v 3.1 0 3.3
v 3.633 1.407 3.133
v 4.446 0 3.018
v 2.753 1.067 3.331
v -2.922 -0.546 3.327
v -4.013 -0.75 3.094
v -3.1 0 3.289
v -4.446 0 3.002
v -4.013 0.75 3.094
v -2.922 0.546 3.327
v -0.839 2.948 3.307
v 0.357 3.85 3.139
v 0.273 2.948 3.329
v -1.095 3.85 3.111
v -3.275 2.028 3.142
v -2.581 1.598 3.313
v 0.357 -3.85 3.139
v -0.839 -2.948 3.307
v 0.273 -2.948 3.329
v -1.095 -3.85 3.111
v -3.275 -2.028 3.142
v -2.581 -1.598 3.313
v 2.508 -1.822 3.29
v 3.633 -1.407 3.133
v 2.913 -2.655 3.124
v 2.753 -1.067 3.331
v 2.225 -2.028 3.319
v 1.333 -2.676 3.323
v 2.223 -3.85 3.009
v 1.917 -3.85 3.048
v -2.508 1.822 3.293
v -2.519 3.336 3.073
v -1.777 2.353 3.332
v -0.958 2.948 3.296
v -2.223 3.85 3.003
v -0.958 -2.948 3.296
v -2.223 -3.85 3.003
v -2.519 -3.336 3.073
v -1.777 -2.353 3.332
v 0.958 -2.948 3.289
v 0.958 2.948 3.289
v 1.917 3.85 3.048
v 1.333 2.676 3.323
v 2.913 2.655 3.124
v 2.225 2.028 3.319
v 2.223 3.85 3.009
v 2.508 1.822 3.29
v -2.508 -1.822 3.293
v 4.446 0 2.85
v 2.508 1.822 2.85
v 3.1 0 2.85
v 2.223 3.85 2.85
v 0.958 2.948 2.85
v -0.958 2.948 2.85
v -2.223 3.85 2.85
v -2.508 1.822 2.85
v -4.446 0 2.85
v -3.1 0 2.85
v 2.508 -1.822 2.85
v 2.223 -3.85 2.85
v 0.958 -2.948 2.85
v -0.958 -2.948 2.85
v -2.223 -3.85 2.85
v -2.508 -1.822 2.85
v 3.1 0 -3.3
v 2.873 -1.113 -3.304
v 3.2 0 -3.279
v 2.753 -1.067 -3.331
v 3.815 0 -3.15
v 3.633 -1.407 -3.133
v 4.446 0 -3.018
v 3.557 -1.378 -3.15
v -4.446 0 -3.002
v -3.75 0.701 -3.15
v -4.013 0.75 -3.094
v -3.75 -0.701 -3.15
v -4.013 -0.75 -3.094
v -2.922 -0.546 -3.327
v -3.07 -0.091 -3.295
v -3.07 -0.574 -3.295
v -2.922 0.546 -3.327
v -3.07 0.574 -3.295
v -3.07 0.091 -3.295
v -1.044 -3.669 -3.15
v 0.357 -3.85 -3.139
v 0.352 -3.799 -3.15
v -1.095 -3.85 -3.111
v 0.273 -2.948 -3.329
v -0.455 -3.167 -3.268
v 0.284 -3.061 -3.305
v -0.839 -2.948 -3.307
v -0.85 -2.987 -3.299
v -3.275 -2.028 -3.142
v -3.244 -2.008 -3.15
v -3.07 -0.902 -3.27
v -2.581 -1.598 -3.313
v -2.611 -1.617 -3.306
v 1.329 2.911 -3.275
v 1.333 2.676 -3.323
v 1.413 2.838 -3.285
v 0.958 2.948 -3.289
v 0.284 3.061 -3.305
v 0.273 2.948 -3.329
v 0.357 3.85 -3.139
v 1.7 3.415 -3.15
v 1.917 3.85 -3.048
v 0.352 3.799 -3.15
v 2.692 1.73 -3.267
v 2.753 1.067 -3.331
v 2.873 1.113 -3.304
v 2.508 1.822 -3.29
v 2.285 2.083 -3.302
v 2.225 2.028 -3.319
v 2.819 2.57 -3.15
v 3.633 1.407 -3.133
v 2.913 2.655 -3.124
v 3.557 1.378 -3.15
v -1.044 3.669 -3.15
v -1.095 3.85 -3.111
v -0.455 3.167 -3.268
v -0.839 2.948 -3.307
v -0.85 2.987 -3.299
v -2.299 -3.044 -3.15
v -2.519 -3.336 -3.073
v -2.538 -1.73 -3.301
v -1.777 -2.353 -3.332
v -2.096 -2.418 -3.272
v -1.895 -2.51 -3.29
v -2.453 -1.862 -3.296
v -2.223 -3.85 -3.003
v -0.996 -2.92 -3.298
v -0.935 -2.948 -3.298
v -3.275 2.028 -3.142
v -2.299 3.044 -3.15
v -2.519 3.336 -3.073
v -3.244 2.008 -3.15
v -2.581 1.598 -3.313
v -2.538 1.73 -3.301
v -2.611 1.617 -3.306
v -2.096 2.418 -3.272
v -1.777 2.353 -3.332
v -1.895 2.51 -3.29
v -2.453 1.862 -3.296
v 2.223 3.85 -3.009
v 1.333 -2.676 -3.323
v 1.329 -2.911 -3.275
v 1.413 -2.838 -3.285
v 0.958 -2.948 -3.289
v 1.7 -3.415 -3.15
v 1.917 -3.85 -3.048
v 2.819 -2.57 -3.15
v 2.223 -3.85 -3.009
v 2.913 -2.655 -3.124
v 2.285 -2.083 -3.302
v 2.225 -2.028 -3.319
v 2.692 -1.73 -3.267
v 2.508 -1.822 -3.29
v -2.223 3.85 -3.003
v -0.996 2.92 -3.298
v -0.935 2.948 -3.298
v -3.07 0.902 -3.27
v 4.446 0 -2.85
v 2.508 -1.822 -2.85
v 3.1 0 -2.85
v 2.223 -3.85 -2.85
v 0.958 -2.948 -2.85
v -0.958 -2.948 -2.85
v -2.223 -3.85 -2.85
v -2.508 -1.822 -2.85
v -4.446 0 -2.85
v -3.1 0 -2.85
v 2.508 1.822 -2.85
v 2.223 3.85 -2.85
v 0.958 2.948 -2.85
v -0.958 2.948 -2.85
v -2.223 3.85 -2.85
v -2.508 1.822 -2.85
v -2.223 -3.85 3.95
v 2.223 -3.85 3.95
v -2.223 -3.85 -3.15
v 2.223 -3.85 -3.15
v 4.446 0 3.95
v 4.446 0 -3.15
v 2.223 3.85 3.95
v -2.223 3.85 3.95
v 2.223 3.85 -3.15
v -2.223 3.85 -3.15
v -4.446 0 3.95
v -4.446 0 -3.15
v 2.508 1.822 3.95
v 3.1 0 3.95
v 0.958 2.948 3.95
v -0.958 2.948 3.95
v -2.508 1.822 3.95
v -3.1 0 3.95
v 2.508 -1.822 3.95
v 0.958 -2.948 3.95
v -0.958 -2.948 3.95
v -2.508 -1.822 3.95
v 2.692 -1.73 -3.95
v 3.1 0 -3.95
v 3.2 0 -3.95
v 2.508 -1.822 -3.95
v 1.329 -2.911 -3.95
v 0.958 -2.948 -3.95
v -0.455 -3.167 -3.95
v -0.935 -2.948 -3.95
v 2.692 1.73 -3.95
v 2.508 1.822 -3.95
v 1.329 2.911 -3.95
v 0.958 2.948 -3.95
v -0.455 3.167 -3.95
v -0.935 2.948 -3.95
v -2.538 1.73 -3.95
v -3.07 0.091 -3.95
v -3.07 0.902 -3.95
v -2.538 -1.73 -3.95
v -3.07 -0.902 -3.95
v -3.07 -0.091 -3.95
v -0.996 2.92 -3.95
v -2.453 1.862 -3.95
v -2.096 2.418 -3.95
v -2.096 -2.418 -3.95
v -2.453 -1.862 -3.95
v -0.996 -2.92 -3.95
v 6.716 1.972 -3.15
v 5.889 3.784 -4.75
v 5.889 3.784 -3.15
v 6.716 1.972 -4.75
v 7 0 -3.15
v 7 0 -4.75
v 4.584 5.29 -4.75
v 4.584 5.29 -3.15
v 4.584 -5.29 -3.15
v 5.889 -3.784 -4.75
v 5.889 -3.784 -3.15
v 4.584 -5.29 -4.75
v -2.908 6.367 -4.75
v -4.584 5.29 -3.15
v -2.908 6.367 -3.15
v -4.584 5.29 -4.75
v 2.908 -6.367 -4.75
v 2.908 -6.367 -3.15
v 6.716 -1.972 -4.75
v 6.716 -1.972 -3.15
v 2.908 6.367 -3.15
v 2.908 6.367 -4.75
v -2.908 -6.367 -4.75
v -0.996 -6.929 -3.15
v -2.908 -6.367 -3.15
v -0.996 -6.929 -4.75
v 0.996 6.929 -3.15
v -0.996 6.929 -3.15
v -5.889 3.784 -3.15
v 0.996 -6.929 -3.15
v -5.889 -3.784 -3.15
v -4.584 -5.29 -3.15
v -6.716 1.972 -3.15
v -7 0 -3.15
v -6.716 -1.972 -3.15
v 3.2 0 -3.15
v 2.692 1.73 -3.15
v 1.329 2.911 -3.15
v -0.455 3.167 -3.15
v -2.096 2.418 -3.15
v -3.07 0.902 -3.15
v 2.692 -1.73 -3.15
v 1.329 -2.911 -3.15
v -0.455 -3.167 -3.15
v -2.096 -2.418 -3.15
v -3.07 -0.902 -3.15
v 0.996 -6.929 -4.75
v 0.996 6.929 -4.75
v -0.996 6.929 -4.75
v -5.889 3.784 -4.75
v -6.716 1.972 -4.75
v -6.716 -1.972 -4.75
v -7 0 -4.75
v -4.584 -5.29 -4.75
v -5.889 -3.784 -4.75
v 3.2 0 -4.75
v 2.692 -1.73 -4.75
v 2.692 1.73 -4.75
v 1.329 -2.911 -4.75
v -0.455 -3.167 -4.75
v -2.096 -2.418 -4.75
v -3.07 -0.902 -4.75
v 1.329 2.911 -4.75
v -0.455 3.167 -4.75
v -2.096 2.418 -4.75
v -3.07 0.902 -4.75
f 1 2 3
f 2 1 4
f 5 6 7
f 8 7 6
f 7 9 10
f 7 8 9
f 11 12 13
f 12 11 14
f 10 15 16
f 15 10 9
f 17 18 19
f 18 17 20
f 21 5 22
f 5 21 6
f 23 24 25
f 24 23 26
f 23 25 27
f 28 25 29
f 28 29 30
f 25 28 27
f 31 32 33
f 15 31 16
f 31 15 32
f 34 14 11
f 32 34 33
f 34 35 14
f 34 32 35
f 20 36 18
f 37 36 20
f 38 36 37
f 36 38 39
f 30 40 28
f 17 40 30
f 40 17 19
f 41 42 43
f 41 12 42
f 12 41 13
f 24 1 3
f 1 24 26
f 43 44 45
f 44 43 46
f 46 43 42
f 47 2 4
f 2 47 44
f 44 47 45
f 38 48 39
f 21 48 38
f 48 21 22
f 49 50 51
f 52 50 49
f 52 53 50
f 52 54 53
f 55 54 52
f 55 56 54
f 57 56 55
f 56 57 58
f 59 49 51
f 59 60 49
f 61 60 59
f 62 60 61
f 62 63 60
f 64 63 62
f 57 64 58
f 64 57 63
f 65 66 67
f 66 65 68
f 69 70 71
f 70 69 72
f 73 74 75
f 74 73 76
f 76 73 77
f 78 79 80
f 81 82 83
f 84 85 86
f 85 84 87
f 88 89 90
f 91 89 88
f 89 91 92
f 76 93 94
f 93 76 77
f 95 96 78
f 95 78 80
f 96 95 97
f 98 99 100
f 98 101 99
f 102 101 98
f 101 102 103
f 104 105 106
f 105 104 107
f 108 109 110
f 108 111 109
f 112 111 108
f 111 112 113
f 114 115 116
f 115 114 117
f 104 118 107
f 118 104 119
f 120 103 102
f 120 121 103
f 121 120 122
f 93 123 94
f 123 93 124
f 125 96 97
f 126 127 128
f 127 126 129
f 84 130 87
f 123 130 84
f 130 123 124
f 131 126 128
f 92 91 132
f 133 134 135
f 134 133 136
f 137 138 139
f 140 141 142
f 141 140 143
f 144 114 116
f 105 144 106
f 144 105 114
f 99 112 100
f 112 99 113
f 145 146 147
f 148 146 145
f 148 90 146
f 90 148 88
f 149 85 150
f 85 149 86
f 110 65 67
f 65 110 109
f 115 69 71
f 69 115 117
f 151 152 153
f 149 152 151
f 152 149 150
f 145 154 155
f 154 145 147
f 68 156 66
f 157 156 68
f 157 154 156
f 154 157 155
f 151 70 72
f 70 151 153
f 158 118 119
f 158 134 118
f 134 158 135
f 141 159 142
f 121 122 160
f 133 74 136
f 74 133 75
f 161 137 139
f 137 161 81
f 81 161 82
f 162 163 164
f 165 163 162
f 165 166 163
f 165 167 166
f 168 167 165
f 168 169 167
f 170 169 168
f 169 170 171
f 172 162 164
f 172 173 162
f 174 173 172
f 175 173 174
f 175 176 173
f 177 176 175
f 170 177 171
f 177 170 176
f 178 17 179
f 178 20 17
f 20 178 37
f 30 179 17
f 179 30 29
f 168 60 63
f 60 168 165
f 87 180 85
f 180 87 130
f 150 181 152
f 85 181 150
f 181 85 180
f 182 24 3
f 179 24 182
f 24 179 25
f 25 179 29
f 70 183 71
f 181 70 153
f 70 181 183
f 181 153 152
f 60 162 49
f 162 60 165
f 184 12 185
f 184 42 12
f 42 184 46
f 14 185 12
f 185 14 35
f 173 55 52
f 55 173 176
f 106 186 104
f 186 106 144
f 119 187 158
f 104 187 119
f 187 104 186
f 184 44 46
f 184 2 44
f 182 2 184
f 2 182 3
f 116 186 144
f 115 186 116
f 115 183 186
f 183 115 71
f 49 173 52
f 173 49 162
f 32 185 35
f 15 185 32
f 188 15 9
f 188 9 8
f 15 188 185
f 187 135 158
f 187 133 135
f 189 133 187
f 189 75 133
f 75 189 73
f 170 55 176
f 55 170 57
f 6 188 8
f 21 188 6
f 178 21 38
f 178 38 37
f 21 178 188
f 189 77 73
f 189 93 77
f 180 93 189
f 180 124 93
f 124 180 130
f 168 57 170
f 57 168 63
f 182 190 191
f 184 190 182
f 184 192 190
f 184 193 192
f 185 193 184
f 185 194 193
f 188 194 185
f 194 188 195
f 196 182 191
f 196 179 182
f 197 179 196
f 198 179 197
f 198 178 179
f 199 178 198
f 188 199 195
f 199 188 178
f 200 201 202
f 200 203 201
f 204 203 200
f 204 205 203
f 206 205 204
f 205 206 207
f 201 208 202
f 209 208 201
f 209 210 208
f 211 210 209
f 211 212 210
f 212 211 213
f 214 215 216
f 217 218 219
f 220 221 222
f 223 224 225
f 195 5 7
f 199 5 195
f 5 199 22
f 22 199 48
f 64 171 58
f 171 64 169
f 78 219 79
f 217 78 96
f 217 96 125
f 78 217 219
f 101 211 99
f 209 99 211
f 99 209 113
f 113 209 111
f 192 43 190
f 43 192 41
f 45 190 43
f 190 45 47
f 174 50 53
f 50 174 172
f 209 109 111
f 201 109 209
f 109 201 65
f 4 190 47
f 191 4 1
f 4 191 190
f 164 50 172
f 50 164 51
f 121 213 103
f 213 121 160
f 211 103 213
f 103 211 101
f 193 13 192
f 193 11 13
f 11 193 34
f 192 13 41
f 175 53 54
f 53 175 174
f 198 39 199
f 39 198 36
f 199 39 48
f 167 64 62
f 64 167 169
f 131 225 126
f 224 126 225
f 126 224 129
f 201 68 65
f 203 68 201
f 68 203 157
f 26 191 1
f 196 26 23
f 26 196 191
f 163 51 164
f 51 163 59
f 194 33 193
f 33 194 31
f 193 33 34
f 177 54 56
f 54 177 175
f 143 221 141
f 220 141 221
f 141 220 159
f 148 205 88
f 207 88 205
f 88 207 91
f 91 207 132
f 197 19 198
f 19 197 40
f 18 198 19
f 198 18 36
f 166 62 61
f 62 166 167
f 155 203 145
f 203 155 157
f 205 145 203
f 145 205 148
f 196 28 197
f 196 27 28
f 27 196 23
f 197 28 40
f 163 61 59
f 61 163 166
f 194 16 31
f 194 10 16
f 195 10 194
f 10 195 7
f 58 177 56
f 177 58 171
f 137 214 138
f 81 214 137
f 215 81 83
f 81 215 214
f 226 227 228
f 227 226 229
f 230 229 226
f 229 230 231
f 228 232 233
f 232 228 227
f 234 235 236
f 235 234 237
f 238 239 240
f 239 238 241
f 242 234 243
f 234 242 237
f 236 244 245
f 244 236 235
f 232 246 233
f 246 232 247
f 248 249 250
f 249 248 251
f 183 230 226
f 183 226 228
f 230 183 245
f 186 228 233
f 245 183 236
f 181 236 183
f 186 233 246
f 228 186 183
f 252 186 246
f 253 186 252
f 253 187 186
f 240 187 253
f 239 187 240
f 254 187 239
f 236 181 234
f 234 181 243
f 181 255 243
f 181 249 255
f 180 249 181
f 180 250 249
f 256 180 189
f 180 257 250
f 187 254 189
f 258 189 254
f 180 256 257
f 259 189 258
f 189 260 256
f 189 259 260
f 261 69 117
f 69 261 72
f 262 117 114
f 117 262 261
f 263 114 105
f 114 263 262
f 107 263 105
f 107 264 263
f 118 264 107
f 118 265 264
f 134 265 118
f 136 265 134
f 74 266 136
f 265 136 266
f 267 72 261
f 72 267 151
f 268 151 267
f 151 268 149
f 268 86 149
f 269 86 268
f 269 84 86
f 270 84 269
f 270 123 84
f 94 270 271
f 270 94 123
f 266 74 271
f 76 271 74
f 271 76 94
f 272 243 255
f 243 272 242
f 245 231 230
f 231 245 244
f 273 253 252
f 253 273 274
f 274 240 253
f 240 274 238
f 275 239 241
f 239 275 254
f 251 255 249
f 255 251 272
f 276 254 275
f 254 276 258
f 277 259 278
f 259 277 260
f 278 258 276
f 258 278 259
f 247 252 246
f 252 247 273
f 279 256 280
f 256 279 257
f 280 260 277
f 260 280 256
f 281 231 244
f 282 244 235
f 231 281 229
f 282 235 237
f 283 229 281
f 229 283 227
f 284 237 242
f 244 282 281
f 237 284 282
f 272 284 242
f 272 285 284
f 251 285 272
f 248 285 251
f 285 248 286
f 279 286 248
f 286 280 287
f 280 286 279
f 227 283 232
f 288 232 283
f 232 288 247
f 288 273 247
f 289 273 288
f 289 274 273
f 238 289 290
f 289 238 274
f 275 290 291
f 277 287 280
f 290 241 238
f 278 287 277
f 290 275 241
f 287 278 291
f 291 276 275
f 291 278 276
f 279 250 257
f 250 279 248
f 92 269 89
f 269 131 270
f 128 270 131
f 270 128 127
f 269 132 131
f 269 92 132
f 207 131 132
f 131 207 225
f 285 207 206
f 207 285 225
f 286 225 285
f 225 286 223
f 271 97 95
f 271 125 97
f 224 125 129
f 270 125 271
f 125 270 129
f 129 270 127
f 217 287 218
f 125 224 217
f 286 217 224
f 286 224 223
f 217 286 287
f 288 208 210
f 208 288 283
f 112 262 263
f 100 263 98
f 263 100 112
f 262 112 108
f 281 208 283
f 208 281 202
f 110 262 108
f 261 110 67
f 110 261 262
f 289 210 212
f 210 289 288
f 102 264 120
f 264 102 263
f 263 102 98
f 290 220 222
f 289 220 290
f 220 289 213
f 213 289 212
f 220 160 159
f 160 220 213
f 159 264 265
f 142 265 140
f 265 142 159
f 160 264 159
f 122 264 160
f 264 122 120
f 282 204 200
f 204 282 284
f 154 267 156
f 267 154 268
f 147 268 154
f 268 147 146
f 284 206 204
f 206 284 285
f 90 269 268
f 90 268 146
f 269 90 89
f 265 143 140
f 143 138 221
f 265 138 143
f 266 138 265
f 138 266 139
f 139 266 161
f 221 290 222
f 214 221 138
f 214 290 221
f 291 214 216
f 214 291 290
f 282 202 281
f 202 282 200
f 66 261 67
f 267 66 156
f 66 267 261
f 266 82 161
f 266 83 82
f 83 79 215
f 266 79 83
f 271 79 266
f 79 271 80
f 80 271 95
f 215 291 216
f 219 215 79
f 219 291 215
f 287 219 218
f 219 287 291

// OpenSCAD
// Parameters
thread_diameter = 6; //[3:12:0.1]
across_flats = 7.7; //[4:15.4:0.1]
thickness = 7.9; //[4:15.8:0.1]
hole_type = 0; //[0:1:1]
clearance_hole_diameter = 6.2; //[6:7.5:0.05]
thread_pitch = 1; //[0.5:2:0.1]
tap_hole_diameter = 5; //[4:6:0.05]
chamfer_size = 0.3; //[0.1:1:0.05]
overlap = 0.8; //[0.5:2:0.1]
washer_outer_diameter = 14; //[8:28:0.1]
washer_thickness = 1.6; //[0.8:3.2:0.1]
washer_hole_diameter = 6.4; //[6.1:8:0.05]

// Hexagonal Nut with Washer
module nut_and_washer() {
  // Hex Nut Body
  difference() {
    color("DimGray") {
      cylinder(h=thickness, r=(across_flats/2)/cos(30), center=true, $fn=6);
    }
    // Central Through Hole
    cylinder(h=thickness + 2*overlap, r=((1-hole_type)*(clearance_hole_diameter/2) + hole_type*(tap_hole_diameter/2)), center=true);
    // Top and Bottom Chamfers
    union() {
      translate([0, 0, thickness/2 - (chamfer_size + overlap)/2])
        cylinder(h=chamfer_size + overlap, r1=(across_flats/2)/cos(30) + overlap, r2=0, center=true);
      translate([0, 0, -thickness/2 + (chamfer_size + overlap)/2])
        rotate([180, 0, 0])
        cylinder(h=chamfer_size + overlap, r1=(across_flats/2)/cos(30) + overlap, r2=0, center=true);
    }
  }
  
  // Washer
  difference() {
    color("Silver") {
      translate([0, 0, -thickness/2 - washer_thickness/2 + overlap])
        cylinder(h=washer_thickness, r=washer_outer_diameter/2, center=true);
    }
    translate([0, 0, -thickness/2 - washer_thickness/2 + overlap])
      cylinder(h=washer_thickness + 2*overlap, r=washer_hole_diameter/2, center=true);
  }
}

// Assembly
module assembly() {
  nut_and_washer();
}

assembly();
